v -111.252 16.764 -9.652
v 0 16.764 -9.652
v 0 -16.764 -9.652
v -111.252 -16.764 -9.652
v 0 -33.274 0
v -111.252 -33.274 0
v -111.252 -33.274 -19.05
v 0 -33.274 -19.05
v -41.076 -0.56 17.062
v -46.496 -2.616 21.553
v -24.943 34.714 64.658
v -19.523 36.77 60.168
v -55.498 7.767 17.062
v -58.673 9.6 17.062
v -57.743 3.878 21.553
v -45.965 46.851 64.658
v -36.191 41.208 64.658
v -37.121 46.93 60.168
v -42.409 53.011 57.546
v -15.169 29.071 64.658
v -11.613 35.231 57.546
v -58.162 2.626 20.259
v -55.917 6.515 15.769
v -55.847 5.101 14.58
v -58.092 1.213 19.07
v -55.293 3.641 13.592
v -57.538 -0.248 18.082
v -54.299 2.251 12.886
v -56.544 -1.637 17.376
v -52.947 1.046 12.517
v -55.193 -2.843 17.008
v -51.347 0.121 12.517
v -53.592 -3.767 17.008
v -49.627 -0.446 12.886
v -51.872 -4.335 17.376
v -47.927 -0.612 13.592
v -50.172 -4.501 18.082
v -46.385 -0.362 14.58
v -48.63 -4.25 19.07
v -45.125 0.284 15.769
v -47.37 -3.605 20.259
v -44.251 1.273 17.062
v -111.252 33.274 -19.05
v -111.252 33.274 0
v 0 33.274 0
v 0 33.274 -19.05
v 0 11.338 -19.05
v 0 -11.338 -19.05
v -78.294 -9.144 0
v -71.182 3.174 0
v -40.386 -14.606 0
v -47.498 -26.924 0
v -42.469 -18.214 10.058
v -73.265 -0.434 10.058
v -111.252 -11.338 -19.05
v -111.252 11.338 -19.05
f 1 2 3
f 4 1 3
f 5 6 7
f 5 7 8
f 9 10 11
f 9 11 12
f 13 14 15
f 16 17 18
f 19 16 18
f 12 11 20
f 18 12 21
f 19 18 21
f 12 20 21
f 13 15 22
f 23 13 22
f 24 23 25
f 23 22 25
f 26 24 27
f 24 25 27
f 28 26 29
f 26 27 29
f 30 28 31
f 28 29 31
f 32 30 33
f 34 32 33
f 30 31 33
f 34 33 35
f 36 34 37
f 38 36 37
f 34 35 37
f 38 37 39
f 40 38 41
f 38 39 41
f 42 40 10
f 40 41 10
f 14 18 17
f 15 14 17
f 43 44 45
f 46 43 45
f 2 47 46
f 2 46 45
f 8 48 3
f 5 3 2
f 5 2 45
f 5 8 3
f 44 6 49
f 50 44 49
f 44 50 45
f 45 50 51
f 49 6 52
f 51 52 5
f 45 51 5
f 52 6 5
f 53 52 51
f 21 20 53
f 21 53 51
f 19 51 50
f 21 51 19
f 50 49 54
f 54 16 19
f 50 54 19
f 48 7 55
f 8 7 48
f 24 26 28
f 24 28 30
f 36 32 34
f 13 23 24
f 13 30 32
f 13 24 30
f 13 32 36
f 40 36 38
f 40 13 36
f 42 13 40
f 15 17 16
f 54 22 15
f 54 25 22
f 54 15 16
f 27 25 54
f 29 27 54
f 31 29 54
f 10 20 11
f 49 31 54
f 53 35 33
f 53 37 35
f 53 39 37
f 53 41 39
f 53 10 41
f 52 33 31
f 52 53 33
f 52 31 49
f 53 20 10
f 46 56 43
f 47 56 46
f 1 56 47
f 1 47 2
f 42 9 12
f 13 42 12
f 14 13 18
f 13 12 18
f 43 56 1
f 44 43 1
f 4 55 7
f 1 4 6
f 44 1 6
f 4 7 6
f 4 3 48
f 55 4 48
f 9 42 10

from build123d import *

# Parameters (mm, degrees)
F0_W      = 111.252
F0_H      = 19.05
F1_DEPTH  = 33.274
F3_DEPTH  = 111.253
F5_ANGLE  = 45
F7_DEPTH  = 35.56
F9_DEPTH  = 98.2604240246
F11_DEPTH = 60.96
F13_DEPTH = 6.35


with BuildPart() as f1:
    # F0 (on Front) → F1 (new body, symmetric)
    with BuildSketch(Plane.XZ):
        with Locations((-55.626, -9.525)):
            Rectangle(F0_W, F0_H)
    extrude(amount=F1_DEPTH, both=True)

    # F2 (on Right) → F3 (cut, through all)
    with BuildSketch(Plane.YZ):
        Polygon((-11.3380621702, -19.05), (11.3380621702, -19.05), (16.764, -9.652), (-16.764, -9.652), align=None)
    extrude(amount=-F3_DEPTH, mode=Mode.SUBTRACT)

    # F4 (on Top) → F5 (revolve)
    with BuildSketch(Plane.XY):
        Polygon((-78.2938633586, -9.144), (-47.498, -26.924), (-40.386, -14.6056546566), (-71.1818633586, 3.1743453434), align=None)
    revolve(axis=Axis((-62.8959316793, -18.034, 0), (0.8660254038, -0.5, 0)), revolution_arc=F5_ANGLE)

    # F6 (on face) → F7 (join)
    with BuildSketch(Plane(origin=(-23.9650660143, 13.8362373145, 0), x_dir=(0.5, 0.8660254038, 0), z_dir=(0.8660254038, -0.5, 0))):
        Polygon((17.5919761002, 64.6578440717), (-47.0658679715, 0), (-32.8418679715, 0), (31.8159761002, 64.6578440717), align=None)
    extrude(amount=-F7_DEPTH)

    # F8 (on face) → F9 (cut, through all)
    with BuildSketch(Plane(origin=(-23.9650660143, 13.8362373145, 0), x_dir=(0.5, 0.8660254038, 0), z_dir=(0.8660254038, -0.5, 0))):
        Polygon((31.8159761002, 64.6578440717), (17.5919761002, 64.6578440717), (24.7039761002, 57.5458440717), align=None)
    extrude(amount=-F9_DEPTH, mode=Mode.SUBTRACT)

    # F10 (on face) → F11 (cut)
    with BuildSketch(Plane(origin=(20.562455043, 35.6152168628, 41.124910086), x_dir=(0.9354143467, -0.2314550249, -0.2672612419), z_dir=(0.3535533906, 0.6123724357, 0.7071067812))):
        Polygon((-42.8532903043, -11.5935840247), (-61.6659547317, -3.9133459332), (-60.671811363, -11.1779871697), (-48.6475824802, -16.0868580553), align=None)
    extrude(amount=-F11_DEPTH, mode=Mode.SUBTRACT)

    # F12 (on face) → F13 (cut)
    with BuildSketch(Plane(origin=(-11.7664669929, -20.3801186572, 23.5329339857), x_dir=(0.9354143467, -0.2314550249, 0.2672612419), z_dir=(-0.3535533906, -0.6123724357, 0.7071067812))):
        with BuildLine():
            Line((-37.1272253429, 12.1321385858), (-49.1514542257, 17.0410094713))
            ThreePointArc((-49.1514542257, 17.0410094713), (-45.5937752271, 8.5744595872), (-37.1272253429, 12.1321385858))
        make_face()
    extrude(amount=-F13_DEPTH, mode=Mode.SUBTRACT)


solid = f1.part
